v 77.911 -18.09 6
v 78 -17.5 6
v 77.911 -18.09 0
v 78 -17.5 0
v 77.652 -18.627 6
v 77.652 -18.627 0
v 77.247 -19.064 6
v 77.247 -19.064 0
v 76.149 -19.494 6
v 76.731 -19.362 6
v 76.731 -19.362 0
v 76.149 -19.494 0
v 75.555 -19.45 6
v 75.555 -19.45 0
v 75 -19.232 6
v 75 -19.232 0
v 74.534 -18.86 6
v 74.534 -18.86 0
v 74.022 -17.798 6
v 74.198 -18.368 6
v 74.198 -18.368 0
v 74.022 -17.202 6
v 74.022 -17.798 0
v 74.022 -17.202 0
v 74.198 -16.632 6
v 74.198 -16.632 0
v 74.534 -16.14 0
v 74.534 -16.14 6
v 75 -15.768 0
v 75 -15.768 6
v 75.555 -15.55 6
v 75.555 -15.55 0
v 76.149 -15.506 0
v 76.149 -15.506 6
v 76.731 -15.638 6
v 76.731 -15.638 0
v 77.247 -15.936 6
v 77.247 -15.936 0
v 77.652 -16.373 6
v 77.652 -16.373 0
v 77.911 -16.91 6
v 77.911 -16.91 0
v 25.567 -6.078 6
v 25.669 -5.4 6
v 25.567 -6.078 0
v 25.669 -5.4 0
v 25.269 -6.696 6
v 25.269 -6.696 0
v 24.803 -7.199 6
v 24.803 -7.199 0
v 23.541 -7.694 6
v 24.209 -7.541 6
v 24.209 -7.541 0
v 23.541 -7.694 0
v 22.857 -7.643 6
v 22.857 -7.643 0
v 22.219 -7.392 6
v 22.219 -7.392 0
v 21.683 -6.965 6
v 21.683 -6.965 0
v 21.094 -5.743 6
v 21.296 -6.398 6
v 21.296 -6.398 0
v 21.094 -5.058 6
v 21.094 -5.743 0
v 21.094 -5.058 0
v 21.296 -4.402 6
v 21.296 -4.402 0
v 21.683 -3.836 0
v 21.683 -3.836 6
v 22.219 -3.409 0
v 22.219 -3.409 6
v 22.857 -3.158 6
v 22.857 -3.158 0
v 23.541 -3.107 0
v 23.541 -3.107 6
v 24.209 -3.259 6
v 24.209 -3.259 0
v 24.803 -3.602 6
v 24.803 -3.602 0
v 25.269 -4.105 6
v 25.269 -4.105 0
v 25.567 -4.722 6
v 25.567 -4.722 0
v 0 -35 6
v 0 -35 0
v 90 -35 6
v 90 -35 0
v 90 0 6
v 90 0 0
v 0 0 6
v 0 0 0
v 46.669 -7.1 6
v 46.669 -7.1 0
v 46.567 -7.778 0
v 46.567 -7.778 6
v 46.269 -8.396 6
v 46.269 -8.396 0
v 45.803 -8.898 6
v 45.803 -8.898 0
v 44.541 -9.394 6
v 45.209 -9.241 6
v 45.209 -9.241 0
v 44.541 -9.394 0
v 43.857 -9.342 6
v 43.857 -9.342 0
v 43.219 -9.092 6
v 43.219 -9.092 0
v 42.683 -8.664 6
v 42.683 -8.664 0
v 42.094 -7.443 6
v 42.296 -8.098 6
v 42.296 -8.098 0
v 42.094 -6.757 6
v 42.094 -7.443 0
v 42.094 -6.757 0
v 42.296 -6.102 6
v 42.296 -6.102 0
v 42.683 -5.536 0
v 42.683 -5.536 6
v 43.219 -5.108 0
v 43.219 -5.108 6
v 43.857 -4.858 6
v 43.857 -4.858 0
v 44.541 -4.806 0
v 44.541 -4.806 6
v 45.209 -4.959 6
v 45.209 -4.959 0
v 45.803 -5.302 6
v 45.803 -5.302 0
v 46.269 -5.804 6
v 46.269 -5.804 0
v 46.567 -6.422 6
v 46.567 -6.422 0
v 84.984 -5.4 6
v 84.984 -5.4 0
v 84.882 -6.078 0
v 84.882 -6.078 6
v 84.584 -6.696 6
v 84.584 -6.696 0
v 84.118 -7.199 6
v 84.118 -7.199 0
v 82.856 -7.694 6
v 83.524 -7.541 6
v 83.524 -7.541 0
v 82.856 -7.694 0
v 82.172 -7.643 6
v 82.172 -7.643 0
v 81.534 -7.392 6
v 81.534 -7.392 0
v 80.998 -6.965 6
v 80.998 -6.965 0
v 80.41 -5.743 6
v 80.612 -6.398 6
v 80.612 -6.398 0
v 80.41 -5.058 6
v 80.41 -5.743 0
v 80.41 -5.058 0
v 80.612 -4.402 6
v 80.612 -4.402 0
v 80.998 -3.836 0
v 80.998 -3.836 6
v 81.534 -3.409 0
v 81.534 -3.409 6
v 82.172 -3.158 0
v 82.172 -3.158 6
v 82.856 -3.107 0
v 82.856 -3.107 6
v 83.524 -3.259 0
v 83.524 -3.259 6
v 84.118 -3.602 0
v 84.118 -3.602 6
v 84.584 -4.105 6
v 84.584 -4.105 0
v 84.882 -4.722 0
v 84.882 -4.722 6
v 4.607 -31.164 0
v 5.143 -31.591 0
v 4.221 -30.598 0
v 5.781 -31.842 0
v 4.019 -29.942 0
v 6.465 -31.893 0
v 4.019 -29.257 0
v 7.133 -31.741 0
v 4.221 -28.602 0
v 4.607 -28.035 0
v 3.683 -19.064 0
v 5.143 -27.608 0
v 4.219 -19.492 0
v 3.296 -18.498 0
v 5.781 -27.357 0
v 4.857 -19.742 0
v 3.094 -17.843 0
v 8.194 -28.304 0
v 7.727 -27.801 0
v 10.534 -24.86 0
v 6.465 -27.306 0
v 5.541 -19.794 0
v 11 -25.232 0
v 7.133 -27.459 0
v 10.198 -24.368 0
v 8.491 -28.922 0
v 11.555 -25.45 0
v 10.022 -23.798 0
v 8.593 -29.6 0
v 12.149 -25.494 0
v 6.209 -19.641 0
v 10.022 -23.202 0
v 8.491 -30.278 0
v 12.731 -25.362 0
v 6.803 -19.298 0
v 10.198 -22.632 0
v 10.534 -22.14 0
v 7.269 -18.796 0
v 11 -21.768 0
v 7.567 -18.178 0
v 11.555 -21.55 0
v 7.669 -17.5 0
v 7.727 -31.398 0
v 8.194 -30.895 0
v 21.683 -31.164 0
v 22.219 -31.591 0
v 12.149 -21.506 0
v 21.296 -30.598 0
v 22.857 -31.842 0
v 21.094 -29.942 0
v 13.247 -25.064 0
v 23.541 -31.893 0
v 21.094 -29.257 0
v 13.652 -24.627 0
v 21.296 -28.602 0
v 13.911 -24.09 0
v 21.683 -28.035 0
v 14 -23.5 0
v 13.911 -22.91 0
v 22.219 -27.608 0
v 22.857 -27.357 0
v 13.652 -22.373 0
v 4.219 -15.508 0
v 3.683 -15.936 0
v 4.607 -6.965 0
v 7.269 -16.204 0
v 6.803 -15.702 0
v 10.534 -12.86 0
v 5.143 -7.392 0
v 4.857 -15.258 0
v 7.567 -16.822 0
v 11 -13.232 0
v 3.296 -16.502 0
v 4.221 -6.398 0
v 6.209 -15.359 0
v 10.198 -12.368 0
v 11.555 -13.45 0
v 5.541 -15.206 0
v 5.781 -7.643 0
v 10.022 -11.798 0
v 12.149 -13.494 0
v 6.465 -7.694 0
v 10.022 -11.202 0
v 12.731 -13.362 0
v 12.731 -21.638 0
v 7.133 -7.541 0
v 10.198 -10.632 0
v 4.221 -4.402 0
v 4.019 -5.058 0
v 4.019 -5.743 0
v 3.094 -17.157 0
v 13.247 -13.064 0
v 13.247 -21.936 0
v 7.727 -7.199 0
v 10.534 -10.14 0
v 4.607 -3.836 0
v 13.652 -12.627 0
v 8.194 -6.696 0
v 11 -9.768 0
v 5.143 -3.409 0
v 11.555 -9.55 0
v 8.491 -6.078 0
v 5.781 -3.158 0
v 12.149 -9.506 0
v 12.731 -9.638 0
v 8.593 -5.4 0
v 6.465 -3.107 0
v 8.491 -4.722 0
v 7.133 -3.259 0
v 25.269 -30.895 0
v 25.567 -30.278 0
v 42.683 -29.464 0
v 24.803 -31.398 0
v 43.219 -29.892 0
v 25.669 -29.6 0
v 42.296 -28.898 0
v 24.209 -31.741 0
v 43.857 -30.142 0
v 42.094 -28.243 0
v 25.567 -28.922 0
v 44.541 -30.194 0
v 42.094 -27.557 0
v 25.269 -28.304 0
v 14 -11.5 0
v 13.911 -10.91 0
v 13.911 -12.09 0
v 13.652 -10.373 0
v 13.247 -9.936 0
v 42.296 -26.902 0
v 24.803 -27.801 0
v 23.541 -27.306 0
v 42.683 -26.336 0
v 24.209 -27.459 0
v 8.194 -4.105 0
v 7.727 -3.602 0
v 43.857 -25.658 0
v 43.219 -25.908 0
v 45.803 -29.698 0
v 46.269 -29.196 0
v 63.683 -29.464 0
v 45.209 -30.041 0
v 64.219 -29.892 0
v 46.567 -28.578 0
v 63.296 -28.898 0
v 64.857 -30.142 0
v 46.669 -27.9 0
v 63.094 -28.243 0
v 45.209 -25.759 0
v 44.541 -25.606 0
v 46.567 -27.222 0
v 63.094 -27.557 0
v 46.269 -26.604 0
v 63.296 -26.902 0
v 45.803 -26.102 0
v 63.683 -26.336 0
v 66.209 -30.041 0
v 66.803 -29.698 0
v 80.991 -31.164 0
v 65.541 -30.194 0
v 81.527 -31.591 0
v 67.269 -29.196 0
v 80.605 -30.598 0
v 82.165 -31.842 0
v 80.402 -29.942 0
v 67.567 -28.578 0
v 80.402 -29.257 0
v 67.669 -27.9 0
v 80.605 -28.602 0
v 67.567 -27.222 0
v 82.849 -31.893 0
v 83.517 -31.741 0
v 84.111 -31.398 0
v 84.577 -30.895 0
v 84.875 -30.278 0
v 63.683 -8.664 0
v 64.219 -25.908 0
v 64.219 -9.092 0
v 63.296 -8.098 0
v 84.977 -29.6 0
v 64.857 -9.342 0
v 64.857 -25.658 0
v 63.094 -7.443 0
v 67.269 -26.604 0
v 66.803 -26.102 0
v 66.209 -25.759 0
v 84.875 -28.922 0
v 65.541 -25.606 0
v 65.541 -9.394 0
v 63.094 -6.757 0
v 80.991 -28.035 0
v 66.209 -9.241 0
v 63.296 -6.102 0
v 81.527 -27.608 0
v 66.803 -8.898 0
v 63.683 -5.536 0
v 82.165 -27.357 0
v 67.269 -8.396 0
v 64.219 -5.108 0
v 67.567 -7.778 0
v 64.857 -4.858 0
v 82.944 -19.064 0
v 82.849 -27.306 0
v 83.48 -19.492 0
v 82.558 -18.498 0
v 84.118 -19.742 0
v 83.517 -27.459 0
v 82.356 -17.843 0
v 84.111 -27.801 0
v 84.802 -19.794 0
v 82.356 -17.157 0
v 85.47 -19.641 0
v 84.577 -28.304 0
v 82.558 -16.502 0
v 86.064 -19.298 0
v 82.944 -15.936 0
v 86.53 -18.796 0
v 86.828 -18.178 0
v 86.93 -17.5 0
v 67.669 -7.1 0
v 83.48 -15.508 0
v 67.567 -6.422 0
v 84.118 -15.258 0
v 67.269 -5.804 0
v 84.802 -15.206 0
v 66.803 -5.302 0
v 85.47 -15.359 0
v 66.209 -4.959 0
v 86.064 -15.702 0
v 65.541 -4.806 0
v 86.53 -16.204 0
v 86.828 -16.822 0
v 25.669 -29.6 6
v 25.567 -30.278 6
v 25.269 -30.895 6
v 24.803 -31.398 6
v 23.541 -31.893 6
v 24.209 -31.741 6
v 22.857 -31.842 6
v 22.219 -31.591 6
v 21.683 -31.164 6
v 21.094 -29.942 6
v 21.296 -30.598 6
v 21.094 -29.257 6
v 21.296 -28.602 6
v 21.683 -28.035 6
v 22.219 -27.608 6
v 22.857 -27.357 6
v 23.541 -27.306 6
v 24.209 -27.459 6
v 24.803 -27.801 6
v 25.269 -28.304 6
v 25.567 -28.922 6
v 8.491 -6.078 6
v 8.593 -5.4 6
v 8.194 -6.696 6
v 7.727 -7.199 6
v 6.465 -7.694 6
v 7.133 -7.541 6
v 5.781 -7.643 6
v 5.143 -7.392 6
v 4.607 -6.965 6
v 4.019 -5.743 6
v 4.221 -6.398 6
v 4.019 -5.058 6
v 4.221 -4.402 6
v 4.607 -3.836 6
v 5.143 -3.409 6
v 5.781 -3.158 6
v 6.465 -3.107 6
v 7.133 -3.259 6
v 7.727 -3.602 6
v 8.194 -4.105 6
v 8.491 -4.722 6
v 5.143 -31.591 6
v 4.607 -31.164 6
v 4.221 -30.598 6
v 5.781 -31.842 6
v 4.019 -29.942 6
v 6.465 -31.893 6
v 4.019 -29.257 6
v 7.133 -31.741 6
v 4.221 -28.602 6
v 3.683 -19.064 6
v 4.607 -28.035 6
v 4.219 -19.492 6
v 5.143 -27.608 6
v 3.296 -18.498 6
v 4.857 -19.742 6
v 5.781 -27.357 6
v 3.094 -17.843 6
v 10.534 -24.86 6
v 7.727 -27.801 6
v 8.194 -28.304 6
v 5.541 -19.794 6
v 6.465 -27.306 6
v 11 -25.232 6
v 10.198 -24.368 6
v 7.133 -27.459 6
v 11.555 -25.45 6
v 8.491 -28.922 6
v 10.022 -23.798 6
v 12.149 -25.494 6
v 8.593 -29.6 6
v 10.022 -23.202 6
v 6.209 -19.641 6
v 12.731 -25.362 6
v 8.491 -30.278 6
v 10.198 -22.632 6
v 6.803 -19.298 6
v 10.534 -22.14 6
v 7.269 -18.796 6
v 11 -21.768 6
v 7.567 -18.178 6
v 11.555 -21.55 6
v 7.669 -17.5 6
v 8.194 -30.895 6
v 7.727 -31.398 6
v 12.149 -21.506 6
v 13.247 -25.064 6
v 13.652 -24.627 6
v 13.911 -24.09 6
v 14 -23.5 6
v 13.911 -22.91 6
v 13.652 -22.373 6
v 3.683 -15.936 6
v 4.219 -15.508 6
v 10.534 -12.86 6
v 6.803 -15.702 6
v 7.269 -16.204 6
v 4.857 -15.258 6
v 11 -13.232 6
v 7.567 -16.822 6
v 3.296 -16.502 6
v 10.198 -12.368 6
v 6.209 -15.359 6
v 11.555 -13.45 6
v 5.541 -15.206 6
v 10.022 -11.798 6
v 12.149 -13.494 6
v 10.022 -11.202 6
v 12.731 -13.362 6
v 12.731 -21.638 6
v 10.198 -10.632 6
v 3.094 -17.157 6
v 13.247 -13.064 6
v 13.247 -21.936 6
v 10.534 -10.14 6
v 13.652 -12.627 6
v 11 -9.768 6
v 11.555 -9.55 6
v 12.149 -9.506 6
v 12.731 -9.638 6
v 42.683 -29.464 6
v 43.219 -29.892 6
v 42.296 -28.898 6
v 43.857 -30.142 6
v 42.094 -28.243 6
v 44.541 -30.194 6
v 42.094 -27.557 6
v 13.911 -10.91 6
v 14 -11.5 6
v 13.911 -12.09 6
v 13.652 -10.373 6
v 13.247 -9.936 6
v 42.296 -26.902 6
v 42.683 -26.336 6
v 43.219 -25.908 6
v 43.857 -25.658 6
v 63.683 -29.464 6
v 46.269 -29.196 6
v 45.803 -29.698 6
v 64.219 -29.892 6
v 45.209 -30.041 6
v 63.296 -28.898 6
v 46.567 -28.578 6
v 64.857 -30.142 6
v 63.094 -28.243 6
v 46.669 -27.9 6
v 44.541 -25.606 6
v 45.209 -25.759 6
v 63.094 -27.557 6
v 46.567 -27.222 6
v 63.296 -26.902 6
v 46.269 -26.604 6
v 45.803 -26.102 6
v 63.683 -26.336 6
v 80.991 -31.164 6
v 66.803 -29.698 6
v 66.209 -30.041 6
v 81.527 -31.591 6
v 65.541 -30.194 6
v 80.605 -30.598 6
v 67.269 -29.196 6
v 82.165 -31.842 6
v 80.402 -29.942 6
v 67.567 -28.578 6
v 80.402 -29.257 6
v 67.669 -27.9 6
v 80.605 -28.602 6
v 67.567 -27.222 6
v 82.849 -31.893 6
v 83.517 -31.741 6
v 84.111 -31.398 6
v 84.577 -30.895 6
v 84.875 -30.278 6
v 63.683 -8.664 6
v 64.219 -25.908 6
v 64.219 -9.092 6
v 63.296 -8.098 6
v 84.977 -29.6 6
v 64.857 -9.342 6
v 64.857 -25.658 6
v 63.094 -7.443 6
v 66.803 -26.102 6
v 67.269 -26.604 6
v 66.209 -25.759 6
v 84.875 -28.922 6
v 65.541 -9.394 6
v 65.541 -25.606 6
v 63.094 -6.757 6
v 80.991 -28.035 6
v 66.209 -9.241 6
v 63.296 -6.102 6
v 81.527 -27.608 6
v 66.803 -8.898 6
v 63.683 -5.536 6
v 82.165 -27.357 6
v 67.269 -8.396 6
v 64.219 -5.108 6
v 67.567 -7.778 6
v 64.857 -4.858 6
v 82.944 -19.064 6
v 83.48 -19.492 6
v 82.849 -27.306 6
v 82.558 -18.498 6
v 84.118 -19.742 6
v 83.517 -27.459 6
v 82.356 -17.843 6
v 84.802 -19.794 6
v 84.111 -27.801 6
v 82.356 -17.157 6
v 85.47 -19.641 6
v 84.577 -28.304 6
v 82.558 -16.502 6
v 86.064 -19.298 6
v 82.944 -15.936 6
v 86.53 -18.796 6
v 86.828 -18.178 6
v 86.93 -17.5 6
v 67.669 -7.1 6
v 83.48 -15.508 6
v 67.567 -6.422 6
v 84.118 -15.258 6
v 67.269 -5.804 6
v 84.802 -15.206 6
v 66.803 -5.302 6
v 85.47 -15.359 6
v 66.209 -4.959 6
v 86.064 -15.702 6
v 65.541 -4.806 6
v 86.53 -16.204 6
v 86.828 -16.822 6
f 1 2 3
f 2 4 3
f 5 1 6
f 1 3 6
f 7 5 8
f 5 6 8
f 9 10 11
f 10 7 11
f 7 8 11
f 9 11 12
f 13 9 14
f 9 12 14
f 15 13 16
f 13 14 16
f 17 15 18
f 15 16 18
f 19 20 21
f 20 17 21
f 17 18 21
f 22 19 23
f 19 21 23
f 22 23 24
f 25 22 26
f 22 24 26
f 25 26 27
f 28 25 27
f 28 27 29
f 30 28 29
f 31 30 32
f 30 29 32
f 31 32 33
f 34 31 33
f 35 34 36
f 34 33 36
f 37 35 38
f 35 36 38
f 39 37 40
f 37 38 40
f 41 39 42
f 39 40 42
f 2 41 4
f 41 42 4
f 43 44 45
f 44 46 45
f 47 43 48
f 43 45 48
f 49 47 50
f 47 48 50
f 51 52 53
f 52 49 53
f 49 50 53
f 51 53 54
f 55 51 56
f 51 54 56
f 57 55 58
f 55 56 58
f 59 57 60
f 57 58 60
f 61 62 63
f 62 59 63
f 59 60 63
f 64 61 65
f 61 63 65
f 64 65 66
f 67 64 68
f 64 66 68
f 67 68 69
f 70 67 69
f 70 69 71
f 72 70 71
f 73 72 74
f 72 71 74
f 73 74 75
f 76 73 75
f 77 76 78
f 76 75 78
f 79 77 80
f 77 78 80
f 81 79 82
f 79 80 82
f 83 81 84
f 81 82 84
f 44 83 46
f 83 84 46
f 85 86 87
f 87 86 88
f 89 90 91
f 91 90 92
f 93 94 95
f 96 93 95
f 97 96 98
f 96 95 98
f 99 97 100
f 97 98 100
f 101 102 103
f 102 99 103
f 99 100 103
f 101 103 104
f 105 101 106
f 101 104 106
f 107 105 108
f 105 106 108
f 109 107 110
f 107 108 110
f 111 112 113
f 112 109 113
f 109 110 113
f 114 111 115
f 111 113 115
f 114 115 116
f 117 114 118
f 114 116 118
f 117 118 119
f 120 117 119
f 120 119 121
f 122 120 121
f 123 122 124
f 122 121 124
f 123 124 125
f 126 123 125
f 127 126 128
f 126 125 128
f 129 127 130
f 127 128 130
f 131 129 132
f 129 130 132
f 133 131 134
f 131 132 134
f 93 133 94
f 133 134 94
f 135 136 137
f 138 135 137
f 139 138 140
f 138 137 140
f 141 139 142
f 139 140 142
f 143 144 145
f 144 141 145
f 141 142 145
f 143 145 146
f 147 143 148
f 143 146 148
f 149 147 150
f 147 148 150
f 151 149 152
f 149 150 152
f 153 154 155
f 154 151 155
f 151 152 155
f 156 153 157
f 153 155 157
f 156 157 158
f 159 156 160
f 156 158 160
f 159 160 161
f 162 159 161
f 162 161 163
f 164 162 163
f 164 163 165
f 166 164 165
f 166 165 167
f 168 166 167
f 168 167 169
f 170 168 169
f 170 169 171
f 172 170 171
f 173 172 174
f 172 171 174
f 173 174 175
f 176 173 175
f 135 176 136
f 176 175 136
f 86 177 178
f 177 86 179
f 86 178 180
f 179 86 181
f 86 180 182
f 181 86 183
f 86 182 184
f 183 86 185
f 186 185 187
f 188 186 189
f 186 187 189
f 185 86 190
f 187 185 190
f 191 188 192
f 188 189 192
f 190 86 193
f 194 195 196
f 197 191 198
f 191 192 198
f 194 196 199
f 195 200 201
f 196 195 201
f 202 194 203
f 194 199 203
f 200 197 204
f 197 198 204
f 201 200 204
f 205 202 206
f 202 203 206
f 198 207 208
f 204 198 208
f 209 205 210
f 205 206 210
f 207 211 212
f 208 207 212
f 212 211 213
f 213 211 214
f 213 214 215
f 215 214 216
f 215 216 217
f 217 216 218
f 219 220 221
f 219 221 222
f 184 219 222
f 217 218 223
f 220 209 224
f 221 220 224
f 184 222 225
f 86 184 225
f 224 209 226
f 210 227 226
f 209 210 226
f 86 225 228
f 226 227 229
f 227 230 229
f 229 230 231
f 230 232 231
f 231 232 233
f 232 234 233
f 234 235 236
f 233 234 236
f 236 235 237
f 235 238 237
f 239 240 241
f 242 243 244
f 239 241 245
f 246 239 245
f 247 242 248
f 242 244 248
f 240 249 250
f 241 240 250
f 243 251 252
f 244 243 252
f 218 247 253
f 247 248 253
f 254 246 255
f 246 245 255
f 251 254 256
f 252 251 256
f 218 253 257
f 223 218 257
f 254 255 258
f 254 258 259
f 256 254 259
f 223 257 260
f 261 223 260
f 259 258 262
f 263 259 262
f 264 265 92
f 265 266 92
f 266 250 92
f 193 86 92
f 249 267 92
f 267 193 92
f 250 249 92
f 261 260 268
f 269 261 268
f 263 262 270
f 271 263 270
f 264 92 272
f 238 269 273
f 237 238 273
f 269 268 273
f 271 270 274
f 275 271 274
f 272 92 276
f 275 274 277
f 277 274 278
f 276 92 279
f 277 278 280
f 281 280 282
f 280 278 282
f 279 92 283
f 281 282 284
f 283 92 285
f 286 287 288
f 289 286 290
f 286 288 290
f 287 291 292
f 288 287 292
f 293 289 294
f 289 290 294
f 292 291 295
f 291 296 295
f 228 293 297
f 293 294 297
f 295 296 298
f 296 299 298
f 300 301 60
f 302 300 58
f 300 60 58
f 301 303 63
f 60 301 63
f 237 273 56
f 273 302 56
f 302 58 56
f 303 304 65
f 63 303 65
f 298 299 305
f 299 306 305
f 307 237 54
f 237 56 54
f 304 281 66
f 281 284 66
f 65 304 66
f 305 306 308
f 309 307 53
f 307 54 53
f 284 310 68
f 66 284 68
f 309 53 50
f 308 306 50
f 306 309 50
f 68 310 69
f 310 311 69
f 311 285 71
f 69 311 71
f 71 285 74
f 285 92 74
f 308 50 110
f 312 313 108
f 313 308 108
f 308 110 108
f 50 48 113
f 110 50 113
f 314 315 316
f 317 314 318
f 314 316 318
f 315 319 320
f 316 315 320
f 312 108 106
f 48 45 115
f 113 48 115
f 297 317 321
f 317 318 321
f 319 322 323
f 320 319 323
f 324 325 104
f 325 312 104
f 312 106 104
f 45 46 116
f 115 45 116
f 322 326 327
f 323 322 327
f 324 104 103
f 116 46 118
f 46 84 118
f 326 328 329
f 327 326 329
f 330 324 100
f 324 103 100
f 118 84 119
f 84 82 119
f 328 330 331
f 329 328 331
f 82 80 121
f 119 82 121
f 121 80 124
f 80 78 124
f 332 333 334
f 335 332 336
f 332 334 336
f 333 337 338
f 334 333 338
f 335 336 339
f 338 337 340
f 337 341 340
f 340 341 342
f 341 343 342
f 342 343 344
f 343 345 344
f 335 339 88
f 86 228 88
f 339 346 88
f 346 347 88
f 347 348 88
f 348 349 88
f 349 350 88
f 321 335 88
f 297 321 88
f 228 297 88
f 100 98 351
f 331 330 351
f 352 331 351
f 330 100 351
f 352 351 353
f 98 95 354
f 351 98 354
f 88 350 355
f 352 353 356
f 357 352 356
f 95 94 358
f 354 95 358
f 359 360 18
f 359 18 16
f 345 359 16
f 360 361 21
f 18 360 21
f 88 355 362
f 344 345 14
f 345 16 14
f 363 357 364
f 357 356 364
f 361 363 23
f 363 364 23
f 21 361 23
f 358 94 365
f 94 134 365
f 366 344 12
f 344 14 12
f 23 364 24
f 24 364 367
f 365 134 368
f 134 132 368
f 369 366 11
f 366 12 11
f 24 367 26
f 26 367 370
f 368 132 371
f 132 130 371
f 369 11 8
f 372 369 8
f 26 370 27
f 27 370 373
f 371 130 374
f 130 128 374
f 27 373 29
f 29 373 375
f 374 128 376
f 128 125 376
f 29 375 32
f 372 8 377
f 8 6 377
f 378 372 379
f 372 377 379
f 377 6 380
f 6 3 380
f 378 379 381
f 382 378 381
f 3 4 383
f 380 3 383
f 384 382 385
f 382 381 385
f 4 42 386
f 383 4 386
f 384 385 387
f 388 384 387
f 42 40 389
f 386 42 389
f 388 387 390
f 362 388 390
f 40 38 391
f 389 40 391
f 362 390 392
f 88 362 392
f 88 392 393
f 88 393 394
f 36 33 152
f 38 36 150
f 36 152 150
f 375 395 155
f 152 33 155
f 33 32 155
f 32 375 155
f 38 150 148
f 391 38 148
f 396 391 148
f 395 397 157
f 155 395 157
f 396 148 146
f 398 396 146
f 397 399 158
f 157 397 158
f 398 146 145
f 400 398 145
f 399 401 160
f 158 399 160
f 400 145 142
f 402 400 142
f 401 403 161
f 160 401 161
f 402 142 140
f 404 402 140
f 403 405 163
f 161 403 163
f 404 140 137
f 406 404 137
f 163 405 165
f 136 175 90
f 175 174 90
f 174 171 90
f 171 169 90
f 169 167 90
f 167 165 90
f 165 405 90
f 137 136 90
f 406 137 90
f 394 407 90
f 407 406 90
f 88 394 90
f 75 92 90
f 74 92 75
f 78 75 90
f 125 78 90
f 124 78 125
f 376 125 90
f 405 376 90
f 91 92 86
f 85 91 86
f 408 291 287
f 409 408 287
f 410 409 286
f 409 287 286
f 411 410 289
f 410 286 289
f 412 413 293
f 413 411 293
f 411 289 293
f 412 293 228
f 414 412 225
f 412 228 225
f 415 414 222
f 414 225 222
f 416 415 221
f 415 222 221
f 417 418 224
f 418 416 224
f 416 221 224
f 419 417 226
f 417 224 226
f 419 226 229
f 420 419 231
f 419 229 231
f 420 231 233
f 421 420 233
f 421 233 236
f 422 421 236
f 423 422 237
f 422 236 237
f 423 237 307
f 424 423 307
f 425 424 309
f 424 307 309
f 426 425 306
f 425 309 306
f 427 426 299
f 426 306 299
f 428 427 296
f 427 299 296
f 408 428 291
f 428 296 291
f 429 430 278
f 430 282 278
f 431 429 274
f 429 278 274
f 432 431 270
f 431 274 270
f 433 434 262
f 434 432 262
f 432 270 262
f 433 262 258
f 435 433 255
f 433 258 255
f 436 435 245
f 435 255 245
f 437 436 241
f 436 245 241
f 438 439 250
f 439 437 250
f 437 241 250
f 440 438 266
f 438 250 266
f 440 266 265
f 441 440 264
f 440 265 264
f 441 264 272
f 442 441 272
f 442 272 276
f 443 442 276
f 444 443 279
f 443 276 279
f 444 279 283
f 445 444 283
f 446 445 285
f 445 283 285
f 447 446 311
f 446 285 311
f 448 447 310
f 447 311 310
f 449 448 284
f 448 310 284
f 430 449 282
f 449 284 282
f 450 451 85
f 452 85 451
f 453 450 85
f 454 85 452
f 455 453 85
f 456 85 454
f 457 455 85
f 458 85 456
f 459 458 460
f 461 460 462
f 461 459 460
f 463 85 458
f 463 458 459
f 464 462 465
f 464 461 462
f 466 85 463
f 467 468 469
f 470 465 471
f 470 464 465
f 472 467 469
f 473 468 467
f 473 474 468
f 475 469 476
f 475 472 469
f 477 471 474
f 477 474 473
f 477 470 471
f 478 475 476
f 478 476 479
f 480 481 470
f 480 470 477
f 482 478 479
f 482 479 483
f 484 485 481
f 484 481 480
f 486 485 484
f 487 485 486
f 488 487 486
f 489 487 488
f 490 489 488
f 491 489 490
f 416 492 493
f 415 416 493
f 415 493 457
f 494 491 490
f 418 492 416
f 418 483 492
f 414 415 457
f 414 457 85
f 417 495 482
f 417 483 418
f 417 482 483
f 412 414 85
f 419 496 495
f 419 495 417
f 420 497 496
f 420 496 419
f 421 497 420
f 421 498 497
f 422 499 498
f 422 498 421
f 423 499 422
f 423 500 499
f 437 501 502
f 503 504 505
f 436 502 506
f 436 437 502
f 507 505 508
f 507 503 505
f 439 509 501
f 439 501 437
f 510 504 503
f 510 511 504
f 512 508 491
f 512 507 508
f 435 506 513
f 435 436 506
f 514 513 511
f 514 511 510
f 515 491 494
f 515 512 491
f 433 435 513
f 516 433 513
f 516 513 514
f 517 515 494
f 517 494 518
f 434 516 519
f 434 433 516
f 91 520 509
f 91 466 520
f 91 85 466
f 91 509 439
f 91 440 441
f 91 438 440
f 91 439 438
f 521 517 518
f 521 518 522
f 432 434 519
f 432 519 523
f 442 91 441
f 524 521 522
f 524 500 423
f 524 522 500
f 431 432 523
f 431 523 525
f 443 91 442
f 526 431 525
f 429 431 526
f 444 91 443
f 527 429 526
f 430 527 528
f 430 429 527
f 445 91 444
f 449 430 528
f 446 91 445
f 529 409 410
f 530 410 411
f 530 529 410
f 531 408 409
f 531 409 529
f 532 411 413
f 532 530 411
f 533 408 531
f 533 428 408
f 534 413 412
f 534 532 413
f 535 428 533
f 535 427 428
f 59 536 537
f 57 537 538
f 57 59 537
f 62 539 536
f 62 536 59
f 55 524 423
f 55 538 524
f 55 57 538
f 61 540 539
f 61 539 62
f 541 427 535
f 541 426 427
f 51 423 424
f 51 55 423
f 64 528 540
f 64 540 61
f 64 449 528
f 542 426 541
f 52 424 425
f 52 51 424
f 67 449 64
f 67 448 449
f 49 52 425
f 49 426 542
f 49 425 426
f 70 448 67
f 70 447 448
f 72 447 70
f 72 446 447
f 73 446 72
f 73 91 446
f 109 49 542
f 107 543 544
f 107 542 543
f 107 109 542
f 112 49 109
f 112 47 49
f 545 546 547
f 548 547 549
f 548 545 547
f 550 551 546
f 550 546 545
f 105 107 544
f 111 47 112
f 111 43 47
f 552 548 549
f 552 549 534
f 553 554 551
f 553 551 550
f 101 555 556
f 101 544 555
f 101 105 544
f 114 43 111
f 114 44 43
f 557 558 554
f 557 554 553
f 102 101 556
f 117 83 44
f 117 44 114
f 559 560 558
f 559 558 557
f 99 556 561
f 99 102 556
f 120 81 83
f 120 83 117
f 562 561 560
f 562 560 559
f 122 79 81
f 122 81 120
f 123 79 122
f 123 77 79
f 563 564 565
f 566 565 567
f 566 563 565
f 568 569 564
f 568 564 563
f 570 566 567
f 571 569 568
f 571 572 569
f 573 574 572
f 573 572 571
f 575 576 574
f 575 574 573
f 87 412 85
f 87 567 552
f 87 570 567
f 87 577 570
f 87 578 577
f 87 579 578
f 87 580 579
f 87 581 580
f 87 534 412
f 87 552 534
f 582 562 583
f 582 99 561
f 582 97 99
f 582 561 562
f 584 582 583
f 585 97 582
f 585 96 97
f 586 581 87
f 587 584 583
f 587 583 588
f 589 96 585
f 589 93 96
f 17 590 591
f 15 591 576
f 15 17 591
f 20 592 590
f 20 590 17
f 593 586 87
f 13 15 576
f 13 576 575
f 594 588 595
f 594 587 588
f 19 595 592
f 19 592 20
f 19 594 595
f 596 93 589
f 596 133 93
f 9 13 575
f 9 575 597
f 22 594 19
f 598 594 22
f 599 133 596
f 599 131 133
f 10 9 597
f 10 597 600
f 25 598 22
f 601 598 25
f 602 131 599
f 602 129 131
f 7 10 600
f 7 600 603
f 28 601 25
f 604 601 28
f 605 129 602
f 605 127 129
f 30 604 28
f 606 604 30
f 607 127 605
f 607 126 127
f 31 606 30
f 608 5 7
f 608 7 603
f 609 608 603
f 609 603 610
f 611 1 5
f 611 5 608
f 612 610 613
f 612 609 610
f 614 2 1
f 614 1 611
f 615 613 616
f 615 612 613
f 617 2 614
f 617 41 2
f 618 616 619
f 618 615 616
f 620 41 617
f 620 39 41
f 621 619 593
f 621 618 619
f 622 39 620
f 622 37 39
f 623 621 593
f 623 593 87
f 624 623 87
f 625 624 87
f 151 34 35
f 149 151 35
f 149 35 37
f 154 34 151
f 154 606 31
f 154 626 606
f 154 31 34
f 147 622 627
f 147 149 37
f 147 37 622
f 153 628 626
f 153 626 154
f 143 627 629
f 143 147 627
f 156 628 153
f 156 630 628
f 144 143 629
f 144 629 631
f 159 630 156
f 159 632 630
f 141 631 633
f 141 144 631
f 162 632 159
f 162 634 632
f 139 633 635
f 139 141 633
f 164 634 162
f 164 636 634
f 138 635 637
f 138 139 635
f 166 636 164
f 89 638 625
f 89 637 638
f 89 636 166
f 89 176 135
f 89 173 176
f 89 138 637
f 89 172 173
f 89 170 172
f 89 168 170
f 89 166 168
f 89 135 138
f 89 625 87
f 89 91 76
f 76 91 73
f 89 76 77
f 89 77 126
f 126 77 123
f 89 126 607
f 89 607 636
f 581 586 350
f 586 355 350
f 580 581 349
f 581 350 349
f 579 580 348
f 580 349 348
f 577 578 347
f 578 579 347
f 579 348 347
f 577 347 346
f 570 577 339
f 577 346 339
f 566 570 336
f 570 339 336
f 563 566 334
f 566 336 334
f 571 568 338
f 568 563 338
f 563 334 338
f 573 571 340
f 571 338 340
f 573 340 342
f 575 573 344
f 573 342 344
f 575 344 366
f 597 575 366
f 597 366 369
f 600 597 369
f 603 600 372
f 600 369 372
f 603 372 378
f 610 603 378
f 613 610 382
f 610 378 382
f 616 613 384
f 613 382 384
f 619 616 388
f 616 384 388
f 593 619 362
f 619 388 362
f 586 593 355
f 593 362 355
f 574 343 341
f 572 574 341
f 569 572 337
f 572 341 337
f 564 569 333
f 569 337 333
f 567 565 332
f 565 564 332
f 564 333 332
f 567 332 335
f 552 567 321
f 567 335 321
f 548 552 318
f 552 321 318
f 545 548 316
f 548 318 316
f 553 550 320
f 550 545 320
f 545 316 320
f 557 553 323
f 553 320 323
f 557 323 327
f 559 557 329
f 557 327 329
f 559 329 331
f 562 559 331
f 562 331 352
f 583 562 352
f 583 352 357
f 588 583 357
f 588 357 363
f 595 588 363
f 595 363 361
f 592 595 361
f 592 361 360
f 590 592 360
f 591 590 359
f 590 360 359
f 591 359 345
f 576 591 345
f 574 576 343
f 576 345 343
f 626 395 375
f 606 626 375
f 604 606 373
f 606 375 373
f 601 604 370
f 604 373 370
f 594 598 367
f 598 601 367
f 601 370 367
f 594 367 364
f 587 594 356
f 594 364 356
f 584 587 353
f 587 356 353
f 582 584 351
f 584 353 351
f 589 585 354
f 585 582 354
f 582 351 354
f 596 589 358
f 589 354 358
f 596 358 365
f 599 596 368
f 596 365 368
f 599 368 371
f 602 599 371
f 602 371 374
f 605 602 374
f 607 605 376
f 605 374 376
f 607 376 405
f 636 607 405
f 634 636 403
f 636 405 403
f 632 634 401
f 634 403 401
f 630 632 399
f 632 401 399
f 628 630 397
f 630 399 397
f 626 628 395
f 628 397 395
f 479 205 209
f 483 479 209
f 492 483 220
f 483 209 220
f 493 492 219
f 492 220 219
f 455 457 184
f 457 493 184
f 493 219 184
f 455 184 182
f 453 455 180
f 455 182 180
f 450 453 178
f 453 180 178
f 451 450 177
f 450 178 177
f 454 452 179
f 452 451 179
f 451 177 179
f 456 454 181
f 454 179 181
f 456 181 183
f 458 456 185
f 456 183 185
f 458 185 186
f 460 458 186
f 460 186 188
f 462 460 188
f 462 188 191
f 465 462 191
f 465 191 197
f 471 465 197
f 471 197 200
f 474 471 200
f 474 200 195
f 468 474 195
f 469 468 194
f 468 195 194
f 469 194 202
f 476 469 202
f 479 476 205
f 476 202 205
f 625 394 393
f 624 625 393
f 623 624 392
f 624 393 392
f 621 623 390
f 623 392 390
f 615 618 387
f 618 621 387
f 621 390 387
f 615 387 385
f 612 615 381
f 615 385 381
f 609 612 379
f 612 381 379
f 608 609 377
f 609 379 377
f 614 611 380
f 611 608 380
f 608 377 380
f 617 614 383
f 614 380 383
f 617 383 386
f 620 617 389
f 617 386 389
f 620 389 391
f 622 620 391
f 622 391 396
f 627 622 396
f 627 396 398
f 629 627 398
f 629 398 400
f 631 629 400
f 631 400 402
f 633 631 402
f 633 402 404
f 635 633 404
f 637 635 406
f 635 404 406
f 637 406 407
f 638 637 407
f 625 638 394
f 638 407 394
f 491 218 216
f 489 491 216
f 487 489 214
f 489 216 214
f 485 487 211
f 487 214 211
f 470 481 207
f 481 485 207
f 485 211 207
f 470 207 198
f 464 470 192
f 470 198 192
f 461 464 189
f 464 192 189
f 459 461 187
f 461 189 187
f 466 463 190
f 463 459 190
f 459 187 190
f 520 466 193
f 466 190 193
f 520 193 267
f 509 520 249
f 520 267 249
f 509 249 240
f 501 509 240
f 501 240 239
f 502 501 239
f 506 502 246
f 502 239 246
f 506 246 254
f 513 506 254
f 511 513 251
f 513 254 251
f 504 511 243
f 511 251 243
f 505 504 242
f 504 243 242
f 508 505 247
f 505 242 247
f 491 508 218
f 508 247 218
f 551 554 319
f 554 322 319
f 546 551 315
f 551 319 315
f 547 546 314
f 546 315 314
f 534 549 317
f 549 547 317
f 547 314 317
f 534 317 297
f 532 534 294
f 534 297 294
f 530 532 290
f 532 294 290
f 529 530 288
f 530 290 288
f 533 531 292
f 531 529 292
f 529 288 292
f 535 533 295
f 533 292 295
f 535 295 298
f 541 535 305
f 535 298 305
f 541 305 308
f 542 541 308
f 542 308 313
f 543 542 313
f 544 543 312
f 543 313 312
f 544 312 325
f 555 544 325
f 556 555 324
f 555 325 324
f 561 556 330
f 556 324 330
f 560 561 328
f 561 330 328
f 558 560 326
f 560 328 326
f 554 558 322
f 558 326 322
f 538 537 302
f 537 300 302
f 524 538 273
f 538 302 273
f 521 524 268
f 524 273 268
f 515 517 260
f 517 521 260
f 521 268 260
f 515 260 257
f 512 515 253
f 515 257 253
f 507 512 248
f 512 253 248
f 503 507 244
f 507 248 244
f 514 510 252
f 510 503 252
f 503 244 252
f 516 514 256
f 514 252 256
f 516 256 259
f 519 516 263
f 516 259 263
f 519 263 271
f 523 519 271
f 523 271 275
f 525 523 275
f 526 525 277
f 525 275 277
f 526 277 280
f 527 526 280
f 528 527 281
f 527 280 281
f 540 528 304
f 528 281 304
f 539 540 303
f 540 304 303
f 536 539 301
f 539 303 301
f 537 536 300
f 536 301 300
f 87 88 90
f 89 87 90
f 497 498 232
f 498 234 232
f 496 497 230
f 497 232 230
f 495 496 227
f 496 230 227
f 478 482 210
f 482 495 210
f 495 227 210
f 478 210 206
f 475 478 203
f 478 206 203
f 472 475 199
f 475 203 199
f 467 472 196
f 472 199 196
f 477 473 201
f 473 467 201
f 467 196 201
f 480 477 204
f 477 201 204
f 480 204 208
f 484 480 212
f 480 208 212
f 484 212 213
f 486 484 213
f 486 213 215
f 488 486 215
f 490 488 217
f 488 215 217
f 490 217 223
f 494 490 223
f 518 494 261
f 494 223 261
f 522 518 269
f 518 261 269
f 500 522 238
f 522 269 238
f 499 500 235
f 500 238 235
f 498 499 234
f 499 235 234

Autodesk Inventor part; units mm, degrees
ref_plane "YZ Plane" through (0, 0, 0) normal (1, 0, 0) x (0, 1, 0)
ref_plane "XZ Plane" through (0, 0, 0) normal (0, 1, 0) x (-1, 0, 0)
ref_plane "XY Plane" through (0, 0, 0) normal (0, 0, 1) x (1, 0, 0)
sketch "Esboço1" plane through (0, 0, 0) normal (0, 0, 1) x (1, 0, 0)
  line L0 (90, 0) -> (0, 0)
  line L1 (0, 0) -> (0, -35)
  line L2 (0, -35) -> (90, -35)
  line L3 (90, -35) -> (90, 0)
  circle A0 centre (65.3687, -7.1) radius 2.3
  circle A1 centre (23.3687, -29.5996) radius 2.3
  circle A2 centre (44.3687, -27.9) radius 2.3
  circle A3 centre (44.3687, -7.1) radius 2.3
  circle A4 centre (84.63, -17.5) radius 2.3
  circle A5 centre (5.3687, -17.5) radius 2.3
  circle A6 centre (65.3687, -27.9) radius 2.3
  circle A7 centre (23.3687, -5.4004) radius 2.3
  circle A8 centre (12, -11.5) radius 2
  circle A9 centre (12, -23.5) radius 2
  circle A10 centre (76, -17.5) radius 2
  circle A11 centre (6.2932, -5.4004) radius 2.3
  circle A12 centre (6.2932, -29.5996) radius 2.3
  circle A13 centre (82.6841, -5.4004) radius 2.3
  circle A14 centre (82.6768, -29.5996) radius 2.3
extrude "Extrusão1" add sketch "Esboço1" along normal blind 6
properties part number "acrilico frontal" material "Acrílico, transparente"
